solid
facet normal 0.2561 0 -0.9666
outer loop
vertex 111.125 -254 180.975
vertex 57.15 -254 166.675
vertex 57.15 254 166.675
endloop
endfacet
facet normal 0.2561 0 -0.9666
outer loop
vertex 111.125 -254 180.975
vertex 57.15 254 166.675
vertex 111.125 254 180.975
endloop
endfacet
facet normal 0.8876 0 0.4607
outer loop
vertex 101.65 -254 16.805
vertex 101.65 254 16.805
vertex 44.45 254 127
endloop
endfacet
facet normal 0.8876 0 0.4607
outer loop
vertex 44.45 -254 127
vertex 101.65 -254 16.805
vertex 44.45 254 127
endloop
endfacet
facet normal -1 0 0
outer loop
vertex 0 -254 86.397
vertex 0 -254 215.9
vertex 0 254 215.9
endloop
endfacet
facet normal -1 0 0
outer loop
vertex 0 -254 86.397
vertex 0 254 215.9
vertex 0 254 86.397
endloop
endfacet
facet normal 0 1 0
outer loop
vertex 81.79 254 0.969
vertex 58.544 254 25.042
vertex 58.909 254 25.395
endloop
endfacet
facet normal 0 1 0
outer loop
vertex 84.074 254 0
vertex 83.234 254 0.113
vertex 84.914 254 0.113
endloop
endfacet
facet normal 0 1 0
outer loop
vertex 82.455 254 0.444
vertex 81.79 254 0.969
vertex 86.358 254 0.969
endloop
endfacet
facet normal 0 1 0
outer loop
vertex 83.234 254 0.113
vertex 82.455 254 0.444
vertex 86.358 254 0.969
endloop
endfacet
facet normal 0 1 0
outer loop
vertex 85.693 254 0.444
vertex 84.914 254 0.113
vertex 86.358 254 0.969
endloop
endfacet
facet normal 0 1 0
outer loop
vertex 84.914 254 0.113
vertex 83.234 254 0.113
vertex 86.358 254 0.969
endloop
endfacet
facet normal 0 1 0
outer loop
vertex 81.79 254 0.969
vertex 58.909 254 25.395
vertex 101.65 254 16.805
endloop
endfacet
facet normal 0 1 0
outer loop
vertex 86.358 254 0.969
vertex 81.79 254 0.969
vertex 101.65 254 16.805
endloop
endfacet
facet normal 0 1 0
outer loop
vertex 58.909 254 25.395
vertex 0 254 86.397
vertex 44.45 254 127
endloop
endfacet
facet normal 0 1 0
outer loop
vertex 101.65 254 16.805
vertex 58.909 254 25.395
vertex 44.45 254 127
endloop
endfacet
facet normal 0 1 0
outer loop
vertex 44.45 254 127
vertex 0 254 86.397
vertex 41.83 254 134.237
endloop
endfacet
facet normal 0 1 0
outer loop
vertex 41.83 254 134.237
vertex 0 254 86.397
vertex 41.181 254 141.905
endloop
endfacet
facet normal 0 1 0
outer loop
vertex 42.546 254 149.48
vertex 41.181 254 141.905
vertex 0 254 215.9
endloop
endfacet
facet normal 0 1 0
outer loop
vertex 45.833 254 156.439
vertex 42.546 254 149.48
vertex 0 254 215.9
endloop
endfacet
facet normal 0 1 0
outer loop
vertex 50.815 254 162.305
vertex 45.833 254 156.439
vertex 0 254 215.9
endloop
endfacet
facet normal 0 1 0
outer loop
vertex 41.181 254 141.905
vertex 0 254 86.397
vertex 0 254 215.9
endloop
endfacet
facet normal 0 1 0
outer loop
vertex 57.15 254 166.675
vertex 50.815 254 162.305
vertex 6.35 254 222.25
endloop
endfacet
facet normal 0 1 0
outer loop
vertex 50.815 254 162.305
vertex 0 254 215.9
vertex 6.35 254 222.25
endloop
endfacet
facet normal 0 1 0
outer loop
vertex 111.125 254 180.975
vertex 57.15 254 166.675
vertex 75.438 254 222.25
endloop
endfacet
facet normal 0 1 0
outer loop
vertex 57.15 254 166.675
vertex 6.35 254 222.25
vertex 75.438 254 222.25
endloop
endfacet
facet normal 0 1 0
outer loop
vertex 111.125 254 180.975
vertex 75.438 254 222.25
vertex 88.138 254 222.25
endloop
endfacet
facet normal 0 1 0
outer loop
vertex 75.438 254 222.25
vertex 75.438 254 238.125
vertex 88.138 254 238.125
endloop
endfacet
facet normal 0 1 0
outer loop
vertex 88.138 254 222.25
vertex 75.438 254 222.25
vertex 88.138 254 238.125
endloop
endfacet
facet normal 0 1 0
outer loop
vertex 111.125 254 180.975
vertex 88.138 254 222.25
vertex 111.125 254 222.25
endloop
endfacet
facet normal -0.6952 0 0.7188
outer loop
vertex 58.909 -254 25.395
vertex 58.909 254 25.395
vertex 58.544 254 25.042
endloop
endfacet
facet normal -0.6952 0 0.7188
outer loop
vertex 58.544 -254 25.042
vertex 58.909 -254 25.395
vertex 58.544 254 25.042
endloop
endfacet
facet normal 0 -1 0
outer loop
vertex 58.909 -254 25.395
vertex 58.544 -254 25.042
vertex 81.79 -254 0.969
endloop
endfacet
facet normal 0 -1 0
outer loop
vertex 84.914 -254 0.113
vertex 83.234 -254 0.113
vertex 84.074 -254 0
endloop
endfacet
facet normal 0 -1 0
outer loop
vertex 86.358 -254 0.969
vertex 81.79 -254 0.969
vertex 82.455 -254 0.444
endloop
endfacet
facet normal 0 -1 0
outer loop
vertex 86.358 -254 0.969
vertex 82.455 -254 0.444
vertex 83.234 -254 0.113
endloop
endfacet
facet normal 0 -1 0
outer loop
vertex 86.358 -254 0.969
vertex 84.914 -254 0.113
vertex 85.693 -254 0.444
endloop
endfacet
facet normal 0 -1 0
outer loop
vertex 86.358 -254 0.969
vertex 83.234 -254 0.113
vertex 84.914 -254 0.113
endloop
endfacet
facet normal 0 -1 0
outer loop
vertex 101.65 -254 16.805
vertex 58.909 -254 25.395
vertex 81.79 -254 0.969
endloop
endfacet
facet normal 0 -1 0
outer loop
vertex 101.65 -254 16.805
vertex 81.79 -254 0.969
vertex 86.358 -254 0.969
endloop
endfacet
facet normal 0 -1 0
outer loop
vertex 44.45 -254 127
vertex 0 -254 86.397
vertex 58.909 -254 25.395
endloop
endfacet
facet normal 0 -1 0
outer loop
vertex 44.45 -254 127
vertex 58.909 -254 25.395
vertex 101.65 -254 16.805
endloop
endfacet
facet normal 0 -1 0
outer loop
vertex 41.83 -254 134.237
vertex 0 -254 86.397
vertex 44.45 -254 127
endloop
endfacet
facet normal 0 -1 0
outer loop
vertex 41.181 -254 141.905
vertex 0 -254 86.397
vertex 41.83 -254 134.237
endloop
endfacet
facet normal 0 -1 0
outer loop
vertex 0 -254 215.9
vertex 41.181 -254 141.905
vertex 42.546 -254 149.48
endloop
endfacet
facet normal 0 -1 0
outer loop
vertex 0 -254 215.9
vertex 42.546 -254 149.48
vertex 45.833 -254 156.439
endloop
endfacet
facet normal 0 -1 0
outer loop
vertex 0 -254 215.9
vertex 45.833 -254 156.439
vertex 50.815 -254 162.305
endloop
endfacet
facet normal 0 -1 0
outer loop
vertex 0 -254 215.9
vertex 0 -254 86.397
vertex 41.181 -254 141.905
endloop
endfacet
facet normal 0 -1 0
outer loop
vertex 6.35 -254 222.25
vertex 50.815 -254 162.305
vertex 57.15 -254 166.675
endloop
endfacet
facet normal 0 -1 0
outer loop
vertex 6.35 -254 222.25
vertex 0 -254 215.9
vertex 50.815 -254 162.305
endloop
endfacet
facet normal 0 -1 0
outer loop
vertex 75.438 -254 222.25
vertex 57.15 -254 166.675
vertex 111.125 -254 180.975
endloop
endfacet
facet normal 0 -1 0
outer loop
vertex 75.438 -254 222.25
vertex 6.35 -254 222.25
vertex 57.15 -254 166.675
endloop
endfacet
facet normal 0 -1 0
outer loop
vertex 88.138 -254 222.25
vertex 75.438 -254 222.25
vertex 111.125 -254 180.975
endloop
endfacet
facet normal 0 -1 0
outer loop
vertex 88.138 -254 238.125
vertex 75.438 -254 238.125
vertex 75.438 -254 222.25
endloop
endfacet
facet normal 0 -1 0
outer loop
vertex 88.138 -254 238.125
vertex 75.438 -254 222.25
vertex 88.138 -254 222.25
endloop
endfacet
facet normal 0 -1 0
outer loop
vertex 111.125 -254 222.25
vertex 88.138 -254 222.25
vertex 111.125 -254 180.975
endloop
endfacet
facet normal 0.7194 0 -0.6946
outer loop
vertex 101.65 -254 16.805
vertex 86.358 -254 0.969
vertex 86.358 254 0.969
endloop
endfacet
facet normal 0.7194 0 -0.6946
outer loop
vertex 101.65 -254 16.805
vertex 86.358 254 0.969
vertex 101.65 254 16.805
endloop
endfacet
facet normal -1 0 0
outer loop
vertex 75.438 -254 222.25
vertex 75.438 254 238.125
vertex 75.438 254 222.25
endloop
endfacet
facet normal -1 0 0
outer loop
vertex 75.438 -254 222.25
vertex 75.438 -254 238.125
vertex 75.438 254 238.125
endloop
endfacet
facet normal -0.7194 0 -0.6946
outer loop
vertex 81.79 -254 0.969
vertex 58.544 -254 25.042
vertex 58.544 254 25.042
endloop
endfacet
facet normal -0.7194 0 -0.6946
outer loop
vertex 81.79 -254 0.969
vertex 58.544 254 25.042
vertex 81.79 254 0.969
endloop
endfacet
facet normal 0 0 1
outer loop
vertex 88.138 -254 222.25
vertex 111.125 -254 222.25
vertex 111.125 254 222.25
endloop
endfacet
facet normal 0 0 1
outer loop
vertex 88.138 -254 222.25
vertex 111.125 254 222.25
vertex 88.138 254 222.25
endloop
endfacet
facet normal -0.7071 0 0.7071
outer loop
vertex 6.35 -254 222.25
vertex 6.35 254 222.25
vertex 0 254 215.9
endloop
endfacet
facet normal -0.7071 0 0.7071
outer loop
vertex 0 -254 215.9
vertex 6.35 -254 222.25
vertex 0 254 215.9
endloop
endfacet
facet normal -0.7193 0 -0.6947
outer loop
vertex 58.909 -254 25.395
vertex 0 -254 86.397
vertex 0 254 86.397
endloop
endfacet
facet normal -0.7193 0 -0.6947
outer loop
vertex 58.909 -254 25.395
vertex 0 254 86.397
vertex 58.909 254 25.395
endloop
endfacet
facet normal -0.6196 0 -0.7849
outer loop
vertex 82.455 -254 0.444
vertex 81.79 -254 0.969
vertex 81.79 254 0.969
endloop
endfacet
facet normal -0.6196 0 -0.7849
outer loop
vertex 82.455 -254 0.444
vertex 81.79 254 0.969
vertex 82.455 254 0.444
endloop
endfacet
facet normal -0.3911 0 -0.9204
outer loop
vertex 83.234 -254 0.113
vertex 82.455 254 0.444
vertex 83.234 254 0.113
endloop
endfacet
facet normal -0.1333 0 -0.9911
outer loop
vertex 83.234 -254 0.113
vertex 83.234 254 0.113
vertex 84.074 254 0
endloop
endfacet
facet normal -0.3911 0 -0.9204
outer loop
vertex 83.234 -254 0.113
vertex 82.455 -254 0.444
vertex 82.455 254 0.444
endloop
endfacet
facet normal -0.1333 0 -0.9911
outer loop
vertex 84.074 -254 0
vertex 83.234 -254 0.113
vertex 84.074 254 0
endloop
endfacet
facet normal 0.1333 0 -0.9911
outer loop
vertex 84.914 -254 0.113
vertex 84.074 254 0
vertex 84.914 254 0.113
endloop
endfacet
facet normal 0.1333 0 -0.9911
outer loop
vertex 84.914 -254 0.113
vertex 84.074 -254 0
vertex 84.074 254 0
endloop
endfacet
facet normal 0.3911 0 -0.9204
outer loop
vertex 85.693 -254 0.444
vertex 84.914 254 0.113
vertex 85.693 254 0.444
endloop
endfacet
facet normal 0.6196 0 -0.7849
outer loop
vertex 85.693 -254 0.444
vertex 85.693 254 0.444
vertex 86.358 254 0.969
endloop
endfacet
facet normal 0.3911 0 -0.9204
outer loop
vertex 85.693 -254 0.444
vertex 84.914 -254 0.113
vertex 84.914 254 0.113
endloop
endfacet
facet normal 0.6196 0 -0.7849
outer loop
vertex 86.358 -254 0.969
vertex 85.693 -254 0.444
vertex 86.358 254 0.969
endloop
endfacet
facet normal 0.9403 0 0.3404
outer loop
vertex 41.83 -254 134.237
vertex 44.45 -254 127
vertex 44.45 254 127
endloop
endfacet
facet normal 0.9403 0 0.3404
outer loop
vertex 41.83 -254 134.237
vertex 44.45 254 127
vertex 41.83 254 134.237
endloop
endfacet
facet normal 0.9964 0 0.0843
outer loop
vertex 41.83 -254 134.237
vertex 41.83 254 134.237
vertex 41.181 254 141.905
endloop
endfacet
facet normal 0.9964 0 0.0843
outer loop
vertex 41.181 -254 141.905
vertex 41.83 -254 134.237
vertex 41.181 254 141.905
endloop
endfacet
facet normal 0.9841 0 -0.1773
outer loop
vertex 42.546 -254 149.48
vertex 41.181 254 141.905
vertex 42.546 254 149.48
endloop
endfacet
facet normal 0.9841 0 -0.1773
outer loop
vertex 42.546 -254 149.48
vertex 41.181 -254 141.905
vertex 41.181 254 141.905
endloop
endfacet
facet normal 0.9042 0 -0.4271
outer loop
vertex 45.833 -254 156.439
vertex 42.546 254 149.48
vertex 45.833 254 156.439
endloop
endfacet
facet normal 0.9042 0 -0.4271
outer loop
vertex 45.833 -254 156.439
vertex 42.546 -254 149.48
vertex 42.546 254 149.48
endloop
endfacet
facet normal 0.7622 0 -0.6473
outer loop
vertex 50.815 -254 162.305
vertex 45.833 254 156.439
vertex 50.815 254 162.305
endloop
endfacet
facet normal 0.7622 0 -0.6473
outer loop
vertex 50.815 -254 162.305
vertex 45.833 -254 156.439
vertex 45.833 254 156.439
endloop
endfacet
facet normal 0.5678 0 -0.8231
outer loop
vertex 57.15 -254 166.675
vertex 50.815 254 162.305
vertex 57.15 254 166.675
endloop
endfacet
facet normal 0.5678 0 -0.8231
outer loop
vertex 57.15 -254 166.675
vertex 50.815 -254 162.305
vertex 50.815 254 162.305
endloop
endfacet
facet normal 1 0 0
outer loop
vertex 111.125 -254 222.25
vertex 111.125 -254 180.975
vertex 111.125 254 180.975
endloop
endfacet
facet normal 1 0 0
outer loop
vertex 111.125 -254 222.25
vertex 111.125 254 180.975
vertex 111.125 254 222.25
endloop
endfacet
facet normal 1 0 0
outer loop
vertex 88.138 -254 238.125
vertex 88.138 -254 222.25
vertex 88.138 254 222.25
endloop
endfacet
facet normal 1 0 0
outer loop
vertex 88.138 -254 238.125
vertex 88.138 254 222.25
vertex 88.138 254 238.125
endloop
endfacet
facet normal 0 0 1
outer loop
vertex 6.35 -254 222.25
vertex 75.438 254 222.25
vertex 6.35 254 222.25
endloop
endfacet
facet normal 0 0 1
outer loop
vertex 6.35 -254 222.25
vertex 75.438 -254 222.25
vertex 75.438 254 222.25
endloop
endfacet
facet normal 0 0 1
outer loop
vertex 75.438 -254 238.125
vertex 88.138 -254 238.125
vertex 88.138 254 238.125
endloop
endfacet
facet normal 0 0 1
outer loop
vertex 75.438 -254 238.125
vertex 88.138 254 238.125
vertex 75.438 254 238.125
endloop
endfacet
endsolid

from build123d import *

# Parameters (mm, degrees)
F1_DEPTH      = 254
F1_DEPTH_BACK = 254


with BuildPart() as f1:
    # F0 (on Front) → F1 (new body, two sides)
    with BuildSketch(Plane.XZ) as f1_sk:
        with BuildLine():
            Line((6.35, 222.25), (0, 215.9))
            Line((0, 215.9), (0, 86.396878))
            Line((0, 86.396878), (58.90925, 25.394564))
            Line((58.90925, 25.394564), (58.543826, 25.041678))
            Line((58.543826, 25.041678), (81.790096, 0.96946))
            ThreePointArc((81.790096, 0.96946), (84.074, 0), (86.357904, 0.96946))
            Line((86.357904, 0.96946), (101.649771, 16.804652))
            Line((101.649771, 16.804652), (44.45, 127))
            ThreePointArc((44.45, 127), (42.545992, 149.479528), (57.15, 166.6748))
            Line((57.15, 166.6748), (111.125, 180.975))
            Line((111.125, 180.975), (111.125, 222.25))
            Line((111.125, 222.25), (88.138, 222.25))
            Line((88.138, 222.25), (88.138, 238.125))
            Line((88.138, 238.125), (75.438, 238.125))
            Line((75.438, 238.125), (75.438, 222.25))
            Line((75.438, 222.25), (6.35, 222.25))
        make_face()
    extrude(amount=F1_DEPTH)
    extrude(f1_sk.sketch, amount=-F1_DEPTH_BACK)


solid = f1.part
